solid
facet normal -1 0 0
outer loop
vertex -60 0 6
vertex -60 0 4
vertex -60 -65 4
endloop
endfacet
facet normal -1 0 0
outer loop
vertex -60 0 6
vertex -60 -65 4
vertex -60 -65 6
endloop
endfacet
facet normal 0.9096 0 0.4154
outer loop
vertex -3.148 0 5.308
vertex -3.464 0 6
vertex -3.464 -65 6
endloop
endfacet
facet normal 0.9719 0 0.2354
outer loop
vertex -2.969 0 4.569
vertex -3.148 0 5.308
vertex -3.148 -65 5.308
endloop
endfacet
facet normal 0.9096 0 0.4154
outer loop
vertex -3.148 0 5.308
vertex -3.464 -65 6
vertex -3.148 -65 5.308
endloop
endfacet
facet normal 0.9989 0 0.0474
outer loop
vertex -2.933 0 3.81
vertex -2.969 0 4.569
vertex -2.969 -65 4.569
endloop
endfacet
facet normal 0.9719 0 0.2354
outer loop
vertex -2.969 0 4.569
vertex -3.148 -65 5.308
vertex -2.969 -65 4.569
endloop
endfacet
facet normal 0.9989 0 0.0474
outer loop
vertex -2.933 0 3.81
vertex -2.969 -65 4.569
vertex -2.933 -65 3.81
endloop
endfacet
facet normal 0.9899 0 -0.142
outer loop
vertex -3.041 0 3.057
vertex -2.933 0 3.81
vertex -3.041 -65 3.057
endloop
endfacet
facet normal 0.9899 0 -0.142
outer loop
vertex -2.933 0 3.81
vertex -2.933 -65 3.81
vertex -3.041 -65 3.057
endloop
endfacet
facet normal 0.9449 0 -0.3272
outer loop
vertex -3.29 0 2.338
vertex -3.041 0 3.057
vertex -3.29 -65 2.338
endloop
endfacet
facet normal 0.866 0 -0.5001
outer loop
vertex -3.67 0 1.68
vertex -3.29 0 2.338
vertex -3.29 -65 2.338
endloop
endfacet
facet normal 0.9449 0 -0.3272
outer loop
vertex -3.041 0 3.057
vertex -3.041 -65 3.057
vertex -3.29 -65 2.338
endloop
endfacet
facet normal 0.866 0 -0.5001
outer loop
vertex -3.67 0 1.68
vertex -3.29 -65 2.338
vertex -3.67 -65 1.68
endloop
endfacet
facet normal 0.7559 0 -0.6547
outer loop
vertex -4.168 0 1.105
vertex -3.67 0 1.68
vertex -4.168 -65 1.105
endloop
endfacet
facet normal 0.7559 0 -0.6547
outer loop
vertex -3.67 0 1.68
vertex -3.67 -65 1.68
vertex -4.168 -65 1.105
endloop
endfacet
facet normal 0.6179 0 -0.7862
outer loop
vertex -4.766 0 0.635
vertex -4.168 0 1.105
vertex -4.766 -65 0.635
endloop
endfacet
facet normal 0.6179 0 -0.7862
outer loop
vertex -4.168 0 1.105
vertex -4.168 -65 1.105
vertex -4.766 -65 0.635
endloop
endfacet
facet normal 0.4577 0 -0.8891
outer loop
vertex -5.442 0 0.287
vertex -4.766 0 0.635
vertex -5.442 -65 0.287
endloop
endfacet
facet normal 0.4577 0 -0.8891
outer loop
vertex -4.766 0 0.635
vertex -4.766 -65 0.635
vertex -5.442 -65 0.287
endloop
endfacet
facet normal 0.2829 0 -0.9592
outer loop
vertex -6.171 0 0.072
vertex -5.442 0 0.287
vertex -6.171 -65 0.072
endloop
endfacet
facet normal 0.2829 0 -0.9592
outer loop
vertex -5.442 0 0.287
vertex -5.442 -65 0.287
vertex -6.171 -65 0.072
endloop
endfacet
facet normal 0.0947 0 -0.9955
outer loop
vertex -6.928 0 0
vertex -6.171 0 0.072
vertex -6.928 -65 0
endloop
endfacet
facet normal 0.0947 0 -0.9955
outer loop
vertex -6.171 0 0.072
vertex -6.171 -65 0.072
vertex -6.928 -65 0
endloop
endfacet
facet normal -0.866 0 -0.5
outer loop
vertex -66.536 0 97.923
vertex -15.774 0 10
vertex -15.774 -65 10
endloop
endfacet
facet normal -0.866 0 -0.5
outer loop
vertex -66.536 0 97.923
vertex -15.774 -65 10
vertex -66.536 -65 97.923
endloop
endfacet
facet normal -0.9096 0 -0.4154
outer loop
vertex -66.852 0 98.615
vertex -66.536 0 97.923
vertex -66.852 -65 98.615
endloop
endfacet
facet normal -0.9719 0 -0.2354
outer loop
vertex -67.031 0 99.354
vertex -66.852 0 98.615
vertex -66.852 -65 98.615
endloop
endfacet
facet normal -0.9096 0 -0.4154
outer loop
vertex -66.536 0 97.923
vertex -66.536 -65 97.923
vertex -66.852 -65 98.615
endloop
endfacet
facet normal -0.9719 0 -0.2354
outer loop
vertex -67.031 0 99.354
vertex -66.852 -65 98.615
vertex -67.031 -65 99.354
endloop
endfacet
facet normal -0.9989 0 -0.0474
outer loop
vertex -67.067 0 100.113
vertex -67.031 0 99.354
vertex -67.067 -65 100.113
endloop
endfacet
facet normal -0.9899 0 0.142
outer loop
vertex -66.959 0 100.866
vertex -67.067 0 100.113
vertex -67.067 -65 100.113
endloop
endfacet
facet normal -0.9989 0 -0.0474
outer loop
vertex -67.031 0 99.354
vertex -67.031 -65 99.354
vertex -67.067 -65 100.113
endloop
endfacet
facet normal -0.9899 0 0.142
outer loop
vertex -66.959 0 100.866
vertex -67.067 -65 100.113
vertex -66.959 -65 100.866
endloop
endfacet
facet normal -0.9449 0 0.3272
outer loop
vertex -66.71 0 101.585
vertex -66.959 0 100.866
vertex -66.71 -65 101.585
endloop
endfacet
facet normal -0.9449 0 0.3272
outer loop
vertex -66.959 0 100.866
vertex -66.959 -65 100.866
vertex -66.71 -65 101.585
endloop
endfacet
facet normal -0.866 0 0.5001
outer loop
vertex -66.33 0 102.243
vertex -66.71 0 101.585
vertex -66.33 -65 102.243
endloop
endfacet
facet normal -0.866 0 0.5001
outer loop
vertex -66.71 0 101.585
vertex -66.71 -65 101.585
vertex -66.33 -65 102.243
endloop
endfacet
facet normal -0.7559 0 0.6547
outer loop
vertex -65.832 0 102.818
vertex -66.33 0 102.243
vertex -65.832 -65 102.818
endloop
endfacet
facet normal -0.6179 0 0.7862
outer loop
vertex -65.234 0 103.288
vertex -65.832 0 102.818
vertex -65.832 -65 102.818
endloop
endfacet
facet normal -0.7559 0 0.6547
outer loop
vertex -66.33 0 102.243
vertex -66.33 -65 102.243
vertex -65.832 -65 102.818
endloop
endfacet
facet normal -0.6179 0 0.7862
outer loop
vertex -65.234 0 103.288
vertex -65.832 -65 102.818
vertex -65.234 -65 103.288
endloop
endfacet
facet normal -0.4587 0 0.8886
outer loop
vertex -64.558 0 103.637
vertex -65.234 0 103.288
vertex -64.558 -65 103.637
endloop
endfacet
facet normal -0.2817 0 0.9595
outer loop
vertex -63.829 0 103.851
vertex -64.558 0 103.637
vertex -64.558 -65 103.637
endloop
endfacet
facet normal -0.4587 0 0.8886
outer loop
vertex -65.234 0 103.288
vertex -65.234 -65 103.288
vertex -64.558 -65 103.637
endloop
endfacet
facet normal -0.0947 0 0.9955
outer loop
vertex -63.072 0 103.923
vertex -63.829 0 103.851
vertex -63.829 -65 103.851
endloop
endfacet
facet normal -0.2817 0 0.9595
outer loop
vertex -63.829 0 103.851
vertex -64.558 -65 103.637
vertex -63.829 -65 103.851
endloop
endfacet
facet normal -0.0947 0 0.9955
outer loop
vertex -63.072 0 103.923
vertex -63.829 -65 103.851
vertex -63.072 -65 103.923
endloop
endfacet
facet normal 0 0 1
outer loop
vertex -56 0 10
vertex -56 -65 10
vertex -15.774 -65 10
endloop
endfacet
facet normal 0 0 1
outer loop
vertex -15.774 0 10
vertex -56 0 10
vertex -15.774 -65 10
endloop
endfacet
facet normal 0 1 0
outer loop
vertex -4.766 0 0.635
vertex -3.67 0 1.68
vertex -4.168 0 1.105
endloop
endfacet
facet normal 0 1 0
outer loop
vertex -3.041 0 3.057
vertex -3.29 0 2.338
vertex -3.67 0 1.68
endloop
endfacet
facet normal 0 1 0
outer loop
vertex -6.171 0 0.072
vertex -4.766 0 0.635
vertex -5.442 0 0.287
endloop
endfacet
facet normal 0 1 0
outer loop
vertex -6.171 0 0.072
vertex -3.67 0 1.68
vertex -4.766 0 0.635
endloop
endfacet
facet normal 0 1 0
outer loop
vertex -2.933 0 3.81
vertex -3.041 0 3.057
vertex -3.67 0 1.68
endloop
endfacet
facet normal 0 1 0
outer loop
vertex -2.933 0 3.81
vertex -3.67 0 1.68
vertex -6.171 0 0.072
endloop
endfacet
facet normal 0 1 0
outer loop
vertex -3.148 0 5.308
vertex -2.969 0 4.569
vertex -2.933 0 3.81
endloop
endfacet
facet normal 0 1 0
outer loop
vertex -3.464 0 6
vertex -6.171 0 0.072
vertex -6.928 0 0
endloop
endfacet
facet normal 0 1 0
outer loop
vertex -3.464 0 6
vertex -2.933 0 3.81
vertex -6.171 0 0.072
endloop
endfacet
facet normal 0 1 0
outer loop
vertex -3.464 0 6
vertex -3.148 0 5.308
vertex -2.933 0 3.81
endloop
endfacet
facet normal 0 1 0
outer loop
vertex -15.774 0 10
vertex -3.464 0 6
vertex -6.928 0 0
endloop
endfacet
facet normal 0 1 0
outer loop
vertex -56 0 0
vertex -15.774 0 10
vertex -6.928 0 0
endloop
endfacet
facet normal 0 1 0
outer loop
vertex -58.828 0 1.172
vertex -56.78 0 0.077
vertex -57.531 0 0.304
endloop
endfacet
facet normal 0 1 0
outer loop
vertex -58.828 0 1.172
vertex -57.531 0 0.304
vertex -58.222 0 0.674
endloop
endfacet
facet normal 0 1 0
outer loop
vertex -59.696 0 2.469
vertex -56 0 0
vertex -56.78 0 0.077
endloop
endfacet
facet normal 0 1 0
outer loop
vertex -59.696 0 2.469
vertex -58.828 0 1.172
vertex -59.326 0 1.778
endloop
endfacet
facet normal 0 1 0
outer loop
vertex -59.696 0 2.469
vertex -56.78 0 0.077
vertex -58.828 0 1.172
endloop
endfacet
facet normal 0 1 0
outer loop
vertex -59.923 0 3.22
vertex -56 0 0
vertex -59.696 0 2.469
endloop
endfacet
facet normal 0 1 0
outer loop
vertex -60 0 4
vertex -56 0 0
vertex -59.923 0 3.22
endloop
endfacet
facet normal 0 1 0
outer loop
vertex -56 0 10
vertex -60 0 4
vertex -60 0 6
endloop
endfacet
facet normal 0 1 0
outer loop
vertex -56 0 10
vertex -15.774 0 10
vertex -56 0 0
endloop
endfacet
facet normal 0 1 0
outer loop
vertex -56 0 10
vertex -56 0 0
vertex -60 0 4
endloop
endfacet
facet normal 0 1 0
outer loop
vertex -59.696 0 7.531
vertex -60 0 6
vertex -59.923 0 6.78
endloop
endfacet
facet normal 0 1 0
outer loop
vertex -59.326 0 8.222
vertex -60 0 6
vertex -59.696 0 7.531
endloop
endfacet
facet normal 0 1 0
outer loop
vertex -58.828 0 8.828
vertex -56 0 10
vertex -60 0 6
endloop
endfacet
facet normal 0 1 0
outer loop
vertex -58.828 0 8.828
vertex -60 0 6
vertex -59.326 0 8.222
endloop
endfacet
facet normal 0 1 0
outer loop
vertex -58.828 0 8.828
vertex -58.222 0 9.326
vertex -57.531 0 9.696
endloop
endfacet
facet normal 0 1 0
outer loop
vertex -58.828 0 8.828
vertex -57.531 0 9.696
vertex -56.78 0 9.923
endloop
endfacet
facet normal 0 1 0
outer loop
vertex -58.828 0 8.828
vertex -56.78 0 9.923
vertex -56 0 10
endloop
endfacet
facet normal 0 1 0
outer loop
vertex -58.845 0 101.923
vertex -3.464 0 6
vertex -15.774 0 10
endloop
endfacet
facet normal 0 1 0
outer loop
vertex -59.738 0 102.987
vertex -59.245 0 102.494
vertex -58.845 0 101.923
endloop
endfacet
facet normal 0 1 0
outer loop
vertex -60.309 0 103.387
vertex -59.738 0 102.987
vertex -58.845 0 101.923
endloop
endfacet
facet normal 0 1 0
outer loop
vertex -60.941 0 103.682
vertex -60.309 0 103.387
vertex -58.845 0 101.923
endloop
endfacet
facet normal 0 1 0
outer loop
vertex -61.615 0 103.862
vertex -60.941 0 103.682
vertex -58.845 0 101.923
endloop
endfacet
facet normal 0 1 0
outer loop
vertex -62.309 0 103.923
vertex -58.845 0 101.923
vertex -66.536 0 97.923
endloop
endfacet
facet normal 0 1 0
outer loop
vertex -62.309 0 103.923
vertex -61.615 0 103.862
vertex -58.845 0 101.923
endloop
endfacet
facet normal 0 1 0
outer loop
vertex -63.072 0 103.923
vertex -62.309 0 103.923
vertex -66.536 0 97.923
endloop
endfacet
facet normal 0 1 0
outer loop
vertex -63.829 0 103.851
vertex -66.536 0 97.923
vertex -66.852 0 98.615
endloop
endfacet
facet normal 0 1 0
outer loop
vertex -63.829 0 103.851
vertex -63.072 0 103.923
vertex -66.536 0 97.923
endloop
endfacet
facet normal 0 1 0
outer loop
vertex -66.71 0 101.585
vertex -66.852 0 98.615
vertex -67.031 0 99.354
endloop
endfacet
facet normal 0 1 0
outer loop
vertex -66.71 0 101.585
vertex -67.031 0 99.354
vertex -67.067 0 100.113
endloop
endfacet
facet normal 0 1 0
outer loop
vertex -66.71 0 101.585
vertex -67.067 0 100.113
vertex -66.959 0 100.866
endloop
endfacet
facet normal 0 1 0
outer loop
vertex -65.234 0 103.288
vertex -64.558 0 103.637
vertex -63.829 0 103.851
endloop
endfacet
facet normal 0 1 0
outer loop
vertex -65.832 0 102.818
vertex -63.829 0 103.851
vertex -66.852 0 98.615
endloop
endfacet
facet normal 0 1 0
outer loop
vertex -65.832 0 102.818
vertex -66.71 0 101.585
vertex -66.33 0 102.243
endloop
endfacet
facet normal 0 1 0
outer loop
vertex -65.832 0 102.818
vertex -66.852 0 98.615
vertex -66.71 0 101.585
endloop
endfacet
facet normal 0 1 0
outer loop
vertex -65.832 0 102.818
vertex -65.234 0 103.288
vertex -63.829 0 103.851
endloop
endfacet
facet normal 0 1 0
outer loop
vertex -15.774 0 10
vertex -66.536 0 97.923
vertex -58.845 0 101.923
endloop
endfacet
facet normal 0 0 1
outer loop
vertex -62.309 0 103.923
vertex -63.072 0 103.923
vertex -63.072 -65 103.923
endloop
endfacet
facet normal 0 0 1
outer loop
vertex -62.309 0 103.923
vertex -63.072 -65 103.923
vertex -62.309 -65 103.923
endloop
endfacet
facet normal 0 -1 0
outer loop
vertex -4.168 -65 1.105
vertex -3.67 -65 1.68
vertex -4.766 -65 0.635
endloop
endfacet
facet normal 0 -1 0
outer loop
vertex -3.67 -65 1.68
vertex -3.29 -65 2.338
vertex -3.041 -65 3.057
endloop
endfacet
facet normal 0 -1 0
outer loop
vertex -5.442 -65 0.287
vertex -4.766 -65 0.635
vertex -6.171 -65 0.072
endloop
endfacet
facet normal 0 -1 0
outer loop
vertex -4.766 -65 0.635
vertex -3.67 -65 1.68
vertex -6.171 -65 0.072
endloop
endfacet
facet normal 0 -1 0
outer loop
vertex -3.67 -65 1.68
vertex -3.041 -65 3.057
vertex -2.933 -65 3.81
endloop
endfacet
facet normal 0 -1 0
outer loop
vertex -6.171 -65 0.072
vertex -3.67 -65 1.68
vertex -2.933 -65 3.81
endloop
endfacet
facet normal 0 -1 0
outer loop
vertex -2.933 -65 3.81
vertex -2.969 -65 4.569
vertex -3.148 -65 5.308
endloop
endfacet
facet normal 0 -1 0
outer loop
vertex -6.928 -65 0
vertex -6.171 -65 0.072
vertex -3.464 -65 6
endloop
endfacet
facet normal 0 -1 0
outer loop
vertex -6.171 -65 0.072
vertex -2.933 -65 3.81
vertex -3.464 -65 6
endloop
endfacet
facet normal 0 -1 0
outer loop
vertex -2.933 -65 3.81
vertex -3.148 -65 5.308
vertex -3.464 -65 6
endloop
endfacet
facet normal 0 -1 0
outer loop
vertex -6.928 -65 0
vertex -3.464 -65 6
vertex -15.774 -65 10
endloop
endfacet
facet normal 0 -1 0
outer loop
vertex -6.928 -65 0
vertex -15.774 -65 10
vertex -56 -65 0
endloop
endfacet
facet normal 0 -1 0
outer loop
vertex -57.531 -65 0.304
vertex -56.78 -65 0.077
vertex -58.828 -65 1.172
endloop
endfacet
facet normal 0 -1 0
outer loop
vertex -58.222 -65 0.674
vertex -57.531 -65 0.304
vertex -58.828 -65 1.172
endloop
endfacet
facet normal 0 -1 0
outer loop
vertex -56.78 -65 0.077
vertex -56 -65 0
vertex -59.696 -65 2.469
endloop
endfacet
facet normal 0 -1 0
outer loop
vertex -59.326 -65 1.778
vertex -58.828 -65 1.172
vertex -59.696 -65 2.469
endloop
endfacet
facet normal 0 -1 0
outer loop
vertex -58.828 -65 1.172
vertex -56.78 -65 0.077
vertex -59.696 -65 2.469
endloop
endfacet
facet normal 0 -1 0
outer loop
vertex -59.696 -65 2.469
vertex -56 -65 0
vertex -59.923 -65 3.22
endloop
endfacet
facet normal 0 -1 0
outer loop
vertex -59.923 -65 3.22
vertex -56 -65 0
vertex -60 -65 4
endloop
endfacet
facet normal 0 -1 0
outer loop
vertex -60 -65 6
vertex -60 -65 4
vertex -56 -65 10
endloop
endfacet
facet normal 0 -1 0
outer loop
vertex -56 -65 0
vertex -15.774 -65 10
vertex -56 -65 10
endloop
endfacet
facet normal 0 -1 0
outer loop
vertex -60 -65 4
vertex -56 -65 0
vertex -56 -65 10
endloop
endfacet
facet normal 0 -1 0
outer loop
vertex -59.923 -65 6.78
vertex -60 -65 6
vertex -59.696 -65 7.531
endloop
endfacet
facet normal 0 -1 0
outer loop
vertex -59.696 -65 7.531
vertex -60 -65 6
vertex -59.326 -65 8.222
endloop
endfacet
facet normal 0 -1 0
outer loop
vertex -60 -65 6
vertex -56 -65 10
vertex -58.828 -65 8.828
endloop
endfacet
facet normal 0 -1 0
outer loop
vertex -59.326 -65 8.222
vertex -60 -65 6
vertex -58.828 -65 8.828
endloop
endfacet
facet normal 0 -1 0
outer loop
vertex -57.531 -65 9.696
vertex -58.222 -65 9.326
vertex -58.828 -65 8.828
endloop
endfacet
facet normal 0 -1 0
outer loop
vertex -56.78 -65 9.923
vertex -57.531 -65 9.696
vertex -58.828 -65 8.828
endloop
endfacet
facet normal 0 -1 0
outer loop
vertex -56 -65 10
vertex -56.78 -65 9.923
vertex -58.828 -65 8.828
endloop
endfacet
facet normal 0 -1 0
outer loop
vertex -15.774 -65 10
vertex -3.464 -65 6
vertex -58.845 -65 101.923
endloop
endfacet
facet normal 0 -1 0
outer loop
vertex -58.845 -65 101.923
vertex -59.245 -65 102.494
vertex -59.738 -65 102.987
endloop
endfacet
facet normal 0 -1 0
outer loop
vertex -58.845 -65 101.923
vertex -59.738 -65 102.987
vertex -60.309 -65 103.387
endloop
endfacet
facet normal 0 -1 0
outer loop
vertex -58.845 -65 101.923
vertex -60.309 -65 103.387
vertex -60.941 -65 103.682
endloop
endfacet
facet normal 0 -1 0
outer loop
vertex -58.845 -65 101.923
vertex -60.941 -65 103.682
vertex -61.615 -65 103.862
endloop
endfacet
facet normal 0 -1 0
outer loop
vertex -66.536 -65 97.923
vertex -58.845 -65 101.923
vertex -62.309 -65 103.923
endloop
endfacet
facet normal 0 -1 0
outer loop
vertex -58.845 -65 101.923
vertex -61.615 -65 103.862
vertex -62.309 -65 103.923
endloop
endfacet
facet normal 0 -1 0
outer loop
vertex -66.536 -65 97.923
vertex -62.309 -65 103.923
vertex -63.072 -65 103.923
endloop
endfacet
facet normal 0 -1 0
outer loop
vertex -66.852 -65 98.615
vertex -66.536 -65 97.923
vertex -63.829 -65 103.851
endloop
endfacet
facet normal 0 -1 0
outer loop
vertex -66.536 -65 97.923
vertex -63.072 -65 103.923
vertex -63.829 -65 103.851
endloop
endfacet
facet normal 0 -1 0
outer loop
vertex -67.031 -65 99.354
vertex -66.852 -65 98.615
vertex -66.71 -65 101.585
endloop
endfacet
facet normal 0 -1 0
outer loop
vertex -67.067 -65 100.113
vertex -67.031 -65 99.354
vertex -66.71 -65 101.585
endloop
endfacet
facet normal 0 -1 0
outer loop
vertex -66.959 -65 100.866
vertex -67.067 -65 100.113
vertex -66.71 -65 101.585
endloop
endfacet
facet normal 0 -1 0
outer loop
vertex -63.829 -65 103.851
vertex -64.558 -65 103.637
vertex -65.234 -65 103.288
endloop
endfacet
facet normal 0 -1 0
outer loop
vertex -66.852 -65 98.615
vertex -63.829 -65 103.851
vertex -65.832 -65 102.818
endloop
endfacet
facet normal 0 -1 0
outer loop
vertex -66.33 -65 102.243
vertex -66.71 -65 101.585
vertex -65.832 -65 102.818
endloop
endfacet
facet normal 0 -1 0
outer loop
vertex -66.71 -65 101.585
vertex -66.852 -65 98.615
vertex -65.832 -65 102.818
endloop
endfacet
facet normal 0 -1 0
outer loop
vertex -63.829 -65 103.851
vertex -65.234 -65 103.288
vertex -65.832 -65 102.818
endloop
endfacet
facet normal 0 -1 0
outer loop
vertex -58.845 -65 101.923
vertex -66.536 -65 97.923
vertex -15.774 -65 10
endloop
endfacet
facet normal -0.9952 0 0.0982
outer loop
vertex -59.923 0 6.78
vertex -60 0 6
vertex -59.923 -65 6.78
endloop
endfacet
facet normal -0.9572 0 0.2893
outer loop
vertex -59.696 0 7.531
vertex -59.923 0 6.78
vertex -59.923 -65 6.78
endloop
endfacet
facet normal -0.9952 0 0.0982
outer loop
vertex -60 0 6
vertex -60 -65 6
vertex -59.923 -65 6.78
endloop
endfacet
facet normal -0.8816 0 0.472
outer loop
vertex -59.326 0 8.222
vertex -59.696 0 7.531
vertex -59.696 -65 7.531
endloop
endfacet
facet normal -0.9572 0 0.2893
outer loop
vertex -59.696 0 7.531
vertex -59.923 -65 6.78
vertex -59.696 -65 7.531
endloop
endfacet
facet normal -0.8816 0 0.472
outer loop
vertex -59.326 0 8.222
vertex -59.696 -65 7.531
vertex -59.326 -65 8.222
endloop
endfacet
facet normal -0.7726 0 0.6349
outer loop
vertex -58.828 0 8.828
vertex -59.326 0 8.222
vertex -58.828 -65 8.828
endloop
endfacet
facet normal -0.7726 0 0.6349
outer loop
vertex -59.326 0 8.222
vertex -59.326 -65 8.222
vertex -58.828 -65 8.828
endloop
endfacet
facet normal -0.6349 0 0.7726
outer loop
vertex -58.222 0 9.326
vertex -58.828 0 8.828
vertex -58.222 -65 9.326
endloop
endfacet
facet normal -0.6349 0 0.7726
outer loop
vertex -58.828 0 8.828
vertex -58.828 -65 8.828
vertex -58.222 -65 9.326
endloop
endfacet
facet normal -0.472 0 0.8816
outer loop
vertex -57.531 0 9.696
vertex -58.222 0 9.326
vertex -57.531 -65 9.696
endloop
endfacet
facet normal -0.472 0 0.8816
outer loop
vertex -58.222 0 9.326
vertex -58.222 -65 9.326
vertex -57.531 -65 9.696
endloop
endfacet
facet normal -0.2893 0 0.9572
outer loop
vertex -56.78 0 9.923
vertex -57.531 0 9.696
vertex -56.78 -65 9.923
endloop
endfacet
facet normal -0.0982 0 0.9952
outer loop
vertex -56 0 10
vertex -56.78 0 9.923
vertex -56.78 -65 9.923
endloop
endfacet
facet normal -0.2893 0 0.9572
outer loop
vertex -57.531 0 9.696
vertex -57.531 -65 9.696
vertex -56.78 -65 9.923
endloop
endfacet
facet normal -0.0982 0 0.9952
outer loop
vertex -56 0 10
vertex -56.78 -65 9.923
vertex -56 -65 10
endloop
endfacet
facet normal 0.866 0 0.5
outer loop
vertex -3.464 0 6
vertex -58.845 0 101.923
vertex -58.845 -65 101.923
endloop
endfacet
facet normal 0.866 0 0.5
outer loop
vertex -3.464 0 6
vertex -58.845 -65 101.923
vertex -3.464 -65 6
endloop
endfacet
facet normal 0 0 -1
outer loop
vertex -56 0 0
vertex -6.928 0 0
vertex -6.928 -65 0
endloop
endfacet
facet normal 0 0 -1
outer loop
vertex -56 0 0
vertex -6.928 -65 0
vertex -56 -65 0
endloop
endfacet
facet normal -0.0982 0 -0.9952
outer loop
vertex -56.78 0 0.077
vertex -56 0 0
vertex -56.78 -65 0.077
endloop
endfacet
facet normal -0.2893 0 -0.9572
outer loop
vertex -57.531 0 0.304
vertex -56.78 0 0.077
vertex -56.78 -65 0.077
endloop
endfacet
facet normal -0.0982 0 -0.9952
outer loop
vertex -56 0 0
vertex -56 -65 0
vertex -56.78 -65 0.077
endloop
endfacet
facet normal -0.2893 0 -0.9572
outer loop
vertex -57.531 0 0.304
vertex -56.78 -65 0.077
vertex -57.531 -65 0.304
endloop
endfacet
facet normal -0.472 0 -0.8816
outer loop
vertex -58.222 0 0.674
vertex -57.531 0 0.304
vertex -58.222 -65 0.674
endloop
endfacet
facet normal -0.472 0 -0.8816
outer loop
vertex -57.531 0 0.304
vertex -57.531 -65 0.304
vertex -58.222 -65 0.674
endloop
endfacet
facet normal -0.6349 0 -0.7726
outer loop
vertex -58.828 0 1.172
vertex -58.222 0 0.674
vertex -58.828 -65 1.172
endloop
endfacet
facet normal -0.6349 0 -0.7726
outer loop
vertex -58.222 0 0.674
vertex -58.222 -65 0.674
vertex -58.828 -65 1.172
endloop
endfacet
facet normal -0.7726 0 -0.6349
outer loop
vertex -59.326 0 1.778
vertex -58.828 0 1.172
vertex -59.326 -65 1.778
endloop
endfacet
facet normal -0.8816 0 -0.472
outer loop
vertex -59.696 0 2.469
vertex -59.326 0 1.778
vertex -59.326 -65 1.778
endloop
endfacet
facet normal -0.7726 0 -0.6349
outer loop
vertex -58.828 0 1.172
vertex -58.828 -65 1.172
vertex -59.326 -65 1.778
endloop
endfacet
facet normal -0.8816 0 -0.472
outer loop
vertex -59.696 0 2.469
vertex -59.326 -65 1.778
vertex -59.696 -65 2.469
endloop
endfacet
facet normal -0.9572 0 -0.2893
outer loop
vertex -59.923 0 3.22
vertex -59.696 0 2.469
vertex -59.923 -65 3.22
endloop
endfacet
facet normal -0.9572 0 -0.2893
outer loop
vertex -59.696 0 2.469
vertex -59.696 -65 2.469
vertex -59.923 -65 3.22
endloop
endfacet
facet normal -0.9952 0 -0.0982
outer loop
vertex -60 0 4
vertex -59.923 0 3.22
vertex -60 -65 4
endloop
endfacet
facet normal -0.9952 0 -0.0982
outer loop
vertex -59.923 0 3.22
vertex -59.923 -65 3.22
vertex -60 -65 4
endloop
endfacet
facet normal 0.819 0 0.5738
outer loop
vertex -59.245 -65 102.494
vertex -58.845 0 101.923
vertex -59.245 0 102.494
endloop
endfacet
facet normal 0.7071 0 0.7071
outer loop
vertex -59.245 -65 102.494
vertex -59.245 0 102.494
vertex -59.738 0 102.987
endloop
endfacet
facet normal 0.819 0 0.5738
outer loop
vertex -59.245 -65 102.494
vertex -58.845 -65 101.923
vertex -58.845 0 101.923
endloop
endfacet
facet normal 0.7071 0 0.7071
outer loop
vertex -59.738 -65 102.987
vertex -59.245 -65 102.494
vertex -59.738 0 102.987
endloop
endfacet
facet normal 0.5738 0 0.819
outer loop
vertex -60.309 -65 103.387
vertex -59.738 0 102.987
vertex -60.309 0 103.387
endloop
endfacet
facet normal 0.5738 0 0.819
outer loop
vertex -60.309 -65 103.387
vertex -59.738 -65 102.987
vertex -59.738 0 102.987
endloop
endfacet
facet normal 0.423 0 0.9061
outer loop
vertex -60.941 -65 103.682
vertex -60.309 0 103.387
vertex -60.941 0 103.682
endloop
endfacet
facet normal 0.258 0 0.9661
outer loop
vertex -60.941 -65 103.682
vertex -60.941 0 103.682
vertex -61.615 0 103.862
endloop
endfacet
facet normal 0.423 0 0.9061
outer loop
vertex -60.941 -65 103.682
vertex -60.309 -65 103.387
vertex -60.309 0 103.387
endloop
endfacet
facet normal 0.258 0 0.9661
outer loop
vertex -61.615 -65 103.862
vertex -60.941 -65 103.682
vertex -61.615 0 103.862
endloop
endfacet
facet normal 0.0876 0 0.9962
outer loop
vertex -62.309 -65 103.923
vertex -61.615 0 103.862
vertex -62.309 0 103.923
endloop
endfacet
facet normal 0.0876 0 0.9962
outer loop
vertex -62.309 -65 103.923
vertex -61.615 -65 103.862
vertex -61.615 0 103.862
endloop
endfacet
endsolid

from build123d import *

# Parameters (mm, degrees)
PAD_DEPTH = 65
FILLET_R  = 4


with BuildPart() as part:
    # Sketch → Pad (new body)
    with BuildSketch(Plane.XZ):
        Polygon((-60, 103.923048), (0, 0), (-60, 0), (-60, 10), (-15.773503, 10), (-70, 103.923048), align=None)
    extrude(amount=PAD_DEPTH)

    # Fillet
    fillet_edges = [part.edges().sort_by_distance(p)[0] for p in [
        (0, -32.5, 0),
        (-60, -32.5, 0),
        (-60, -32.5, 10),
        (-70, -32.5, 103.923048),
        (-60, -32.5, 103.923048),
    ]]
    fillet(fillet_edges, radius=FILLET_R)


solid = part.part
